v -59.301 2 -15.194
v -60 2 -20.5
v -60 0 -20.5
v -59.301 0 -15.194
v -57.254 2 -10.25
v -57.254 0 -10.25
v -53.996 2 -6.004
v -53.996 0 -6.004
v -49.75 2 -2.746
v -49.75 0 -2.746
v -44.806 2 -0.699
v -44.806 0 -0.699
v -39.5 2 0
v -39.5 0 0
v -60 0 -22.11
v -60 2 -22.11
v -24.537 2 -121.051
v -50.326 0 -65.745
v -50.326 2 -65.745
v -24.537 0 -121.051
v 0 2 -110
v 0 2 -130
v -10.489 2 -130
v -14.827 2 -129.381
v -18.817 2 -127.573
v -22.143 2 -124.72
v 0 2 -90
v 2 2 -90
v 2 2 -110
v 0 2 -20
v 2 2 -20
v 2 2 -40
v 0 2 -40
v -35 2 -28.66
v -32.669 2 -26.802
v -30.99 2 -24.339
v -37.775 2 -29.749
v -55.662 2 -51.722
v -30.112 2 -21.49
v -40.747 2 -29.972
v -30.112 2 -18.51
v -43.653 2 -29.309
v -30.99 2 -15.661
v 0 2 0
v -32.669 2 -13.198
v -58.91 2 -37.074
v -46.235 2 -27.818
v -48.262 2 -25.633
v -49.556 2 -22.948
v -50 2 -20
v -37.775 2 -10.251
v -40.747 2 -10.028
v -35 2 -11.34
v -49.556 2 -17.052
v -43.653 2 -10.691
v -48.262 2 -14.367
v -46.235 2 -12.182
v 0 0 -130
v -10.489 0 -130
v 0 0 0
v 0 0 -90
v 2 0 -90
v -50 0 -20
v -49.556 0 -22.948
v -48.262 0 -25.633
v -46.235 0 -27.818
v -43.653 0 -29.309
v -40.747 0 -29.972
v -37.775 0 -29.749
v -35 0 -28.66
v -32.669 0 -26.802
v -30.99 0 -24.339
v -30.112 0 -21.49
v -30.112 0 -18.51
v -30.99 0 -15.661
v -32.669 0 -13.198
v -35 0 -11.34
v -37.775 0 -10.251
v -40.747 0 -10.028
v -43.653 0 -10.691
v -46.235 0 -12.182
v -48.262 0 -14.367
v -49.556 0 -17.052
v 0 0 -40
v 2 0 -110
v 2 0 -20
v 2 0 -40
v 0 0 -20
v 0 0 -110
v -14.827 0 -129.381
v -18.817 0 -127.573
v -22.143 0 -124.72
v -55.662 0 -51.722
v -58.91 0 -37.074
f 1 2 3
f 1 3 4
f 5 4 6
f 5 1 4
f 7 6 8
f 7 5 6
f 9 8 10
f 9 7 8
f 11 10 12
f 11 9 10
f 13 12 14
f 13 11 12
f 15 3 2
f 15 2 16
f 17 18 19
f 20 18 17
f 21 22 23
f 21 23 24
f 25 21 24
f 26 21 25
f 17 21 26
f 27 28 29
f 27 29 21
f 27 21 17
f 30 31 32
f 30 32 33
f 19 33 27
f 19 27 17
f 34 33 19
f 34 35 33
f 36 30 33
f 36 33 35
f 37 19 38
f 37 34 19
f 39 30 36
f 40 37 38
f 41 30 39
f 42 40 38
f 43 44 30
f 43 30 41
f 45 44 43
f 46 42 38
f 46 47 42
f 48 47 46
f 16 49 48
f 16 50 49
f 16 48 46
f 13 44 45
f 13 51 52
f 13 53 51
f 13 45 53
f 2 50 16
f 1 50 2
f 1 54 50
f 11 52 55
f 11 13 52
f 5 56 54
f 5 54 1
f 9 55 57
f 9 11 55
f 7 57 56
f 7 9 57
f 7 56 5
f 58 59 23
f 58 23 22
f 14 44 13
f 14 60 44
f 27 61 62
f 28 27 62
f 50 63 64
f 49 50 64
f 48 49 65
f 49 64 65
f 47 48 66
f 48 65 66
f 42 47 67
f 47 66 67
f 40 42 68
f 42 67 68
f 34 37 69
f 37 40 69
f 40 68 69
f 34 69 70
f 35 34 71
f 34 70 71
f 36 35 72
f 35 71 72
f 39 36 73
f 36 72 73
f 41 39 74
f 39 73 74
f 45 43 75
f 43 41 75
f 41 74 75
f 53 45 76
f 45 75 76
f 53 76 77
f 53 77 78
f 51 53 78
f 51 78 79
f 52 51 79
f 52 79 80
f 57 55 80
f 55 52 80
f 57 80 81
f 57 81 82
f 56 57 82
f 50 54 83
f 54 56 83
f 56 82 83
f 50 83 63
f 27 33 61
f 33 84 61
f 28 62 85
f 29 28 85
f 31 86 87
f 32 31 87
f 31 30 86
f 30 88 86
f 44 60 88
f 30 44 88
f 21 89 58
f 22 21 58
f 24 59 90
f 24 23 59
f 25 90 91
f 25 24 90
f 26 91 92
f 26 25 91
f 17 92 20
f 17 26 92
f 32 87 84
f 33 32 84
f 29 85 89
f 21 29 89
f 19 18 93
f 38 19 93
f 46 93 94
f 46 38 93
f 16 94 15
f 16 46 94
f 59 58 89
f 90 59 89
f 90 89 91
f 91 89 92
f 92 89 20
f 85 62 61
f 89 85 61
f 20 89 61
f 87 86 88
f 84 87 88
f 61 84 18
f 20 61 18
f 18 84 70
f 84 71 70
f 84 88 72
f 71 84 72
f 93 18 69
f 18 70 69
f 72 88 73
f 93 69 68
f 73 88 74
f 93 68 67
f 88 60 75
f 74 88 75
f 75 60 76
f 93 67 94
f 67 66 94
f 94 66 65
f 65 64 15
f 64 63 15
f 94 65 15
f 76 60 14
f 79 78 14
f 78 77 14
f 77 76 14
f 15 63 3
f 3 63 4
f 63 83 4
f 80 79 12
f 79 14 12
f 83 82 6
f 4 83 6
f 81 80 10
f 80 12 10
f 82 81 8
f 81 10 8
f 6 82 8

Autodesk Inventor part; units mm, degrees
ref_plane "YZ Plane" through (0, 0, 0) normal (1, 0, 0) x (0, 1, 0)
ref_plane "XZ Plane" through (0, 0, 0) normal (0, 1, 0) x (-1, 0, 0)
ref_plane "XY Plane" through (0, 0, 0) normal (0, 0, 1) x (1, 0, 0)
sketch "Sketch1" plane through (0, 0, 0) normal (0, 1, 0) x (-1, 0, 0)
  line L0 (0, 0) -> (60, 0)
  line L1 (60, 0) -> (60, -45)
  line L2 (60, -45) -> (20.3638, -130)
  line L3 (20.3638, -130) -> (0, -130)
  line L4 (0, 0) -> (0, -130)
  circle A0 centre (40, -20) radius 10
  line L5 (0, -20) -> (-2, -20)
  line L6 (-2, -20) -> (-2, -40)
  line L7 (-2, -40) -> (0, -40)
  line L8 (0, -40) -> (0, -20)
  line L9 (0, -90) -> (-2, -90)
  line L10 (-2, -90) -> (-2, -110)
  line L11 (-2, -110) -> (0, -110)
  line L12 (0, -110) -> (0, -90)
  dimension "d0" = 45
  dimension "d1" = 40
  dimension "d2" = 20
  dimension "d3" = 20
  dimension "d4" = 130
  dimension "d5" = 20
  dimension "d10" = 25
  dimension "d11" = 2
  dimension "d12" = 2
  dimension "d13" = 20
  dimension "d14" = 20
  dimension "d15" = 20
  dimension "d16" = 20
extrude "Plate1" add sketch "Sketch1" along normal blind 2
fillet "Fillet1" radius 20.5 1 edges at (-60, 1, 0)
fillet "Fillet2" radius 103.25 1 edges at (-60, 1, -45)
fillet "Fillet3" radius 15.5 1 edges at (-20.3638, 1, -130)
equation "\"d6\" = Thickness"
equation "\"BendRadius\" = Thickness"
equation "\"BendReliefWidth\" = Thickness"
equation "\"BendReliefDepth\" = 0.5 * Thickness"
equation "\"CornerReliefSize\" = 4 * Thickness"
equation "\"MinimumRemnant\" = 2 * Thickness"
equation "\"TransitionRadius\" = BendRadius"
equation "\"JacobiRadiusSize\" = BendRadius"
equation "\"GapSize\" = Thickness"
equation "\"Thickness\" = 2"
properties part number "Beslag_stempel"
